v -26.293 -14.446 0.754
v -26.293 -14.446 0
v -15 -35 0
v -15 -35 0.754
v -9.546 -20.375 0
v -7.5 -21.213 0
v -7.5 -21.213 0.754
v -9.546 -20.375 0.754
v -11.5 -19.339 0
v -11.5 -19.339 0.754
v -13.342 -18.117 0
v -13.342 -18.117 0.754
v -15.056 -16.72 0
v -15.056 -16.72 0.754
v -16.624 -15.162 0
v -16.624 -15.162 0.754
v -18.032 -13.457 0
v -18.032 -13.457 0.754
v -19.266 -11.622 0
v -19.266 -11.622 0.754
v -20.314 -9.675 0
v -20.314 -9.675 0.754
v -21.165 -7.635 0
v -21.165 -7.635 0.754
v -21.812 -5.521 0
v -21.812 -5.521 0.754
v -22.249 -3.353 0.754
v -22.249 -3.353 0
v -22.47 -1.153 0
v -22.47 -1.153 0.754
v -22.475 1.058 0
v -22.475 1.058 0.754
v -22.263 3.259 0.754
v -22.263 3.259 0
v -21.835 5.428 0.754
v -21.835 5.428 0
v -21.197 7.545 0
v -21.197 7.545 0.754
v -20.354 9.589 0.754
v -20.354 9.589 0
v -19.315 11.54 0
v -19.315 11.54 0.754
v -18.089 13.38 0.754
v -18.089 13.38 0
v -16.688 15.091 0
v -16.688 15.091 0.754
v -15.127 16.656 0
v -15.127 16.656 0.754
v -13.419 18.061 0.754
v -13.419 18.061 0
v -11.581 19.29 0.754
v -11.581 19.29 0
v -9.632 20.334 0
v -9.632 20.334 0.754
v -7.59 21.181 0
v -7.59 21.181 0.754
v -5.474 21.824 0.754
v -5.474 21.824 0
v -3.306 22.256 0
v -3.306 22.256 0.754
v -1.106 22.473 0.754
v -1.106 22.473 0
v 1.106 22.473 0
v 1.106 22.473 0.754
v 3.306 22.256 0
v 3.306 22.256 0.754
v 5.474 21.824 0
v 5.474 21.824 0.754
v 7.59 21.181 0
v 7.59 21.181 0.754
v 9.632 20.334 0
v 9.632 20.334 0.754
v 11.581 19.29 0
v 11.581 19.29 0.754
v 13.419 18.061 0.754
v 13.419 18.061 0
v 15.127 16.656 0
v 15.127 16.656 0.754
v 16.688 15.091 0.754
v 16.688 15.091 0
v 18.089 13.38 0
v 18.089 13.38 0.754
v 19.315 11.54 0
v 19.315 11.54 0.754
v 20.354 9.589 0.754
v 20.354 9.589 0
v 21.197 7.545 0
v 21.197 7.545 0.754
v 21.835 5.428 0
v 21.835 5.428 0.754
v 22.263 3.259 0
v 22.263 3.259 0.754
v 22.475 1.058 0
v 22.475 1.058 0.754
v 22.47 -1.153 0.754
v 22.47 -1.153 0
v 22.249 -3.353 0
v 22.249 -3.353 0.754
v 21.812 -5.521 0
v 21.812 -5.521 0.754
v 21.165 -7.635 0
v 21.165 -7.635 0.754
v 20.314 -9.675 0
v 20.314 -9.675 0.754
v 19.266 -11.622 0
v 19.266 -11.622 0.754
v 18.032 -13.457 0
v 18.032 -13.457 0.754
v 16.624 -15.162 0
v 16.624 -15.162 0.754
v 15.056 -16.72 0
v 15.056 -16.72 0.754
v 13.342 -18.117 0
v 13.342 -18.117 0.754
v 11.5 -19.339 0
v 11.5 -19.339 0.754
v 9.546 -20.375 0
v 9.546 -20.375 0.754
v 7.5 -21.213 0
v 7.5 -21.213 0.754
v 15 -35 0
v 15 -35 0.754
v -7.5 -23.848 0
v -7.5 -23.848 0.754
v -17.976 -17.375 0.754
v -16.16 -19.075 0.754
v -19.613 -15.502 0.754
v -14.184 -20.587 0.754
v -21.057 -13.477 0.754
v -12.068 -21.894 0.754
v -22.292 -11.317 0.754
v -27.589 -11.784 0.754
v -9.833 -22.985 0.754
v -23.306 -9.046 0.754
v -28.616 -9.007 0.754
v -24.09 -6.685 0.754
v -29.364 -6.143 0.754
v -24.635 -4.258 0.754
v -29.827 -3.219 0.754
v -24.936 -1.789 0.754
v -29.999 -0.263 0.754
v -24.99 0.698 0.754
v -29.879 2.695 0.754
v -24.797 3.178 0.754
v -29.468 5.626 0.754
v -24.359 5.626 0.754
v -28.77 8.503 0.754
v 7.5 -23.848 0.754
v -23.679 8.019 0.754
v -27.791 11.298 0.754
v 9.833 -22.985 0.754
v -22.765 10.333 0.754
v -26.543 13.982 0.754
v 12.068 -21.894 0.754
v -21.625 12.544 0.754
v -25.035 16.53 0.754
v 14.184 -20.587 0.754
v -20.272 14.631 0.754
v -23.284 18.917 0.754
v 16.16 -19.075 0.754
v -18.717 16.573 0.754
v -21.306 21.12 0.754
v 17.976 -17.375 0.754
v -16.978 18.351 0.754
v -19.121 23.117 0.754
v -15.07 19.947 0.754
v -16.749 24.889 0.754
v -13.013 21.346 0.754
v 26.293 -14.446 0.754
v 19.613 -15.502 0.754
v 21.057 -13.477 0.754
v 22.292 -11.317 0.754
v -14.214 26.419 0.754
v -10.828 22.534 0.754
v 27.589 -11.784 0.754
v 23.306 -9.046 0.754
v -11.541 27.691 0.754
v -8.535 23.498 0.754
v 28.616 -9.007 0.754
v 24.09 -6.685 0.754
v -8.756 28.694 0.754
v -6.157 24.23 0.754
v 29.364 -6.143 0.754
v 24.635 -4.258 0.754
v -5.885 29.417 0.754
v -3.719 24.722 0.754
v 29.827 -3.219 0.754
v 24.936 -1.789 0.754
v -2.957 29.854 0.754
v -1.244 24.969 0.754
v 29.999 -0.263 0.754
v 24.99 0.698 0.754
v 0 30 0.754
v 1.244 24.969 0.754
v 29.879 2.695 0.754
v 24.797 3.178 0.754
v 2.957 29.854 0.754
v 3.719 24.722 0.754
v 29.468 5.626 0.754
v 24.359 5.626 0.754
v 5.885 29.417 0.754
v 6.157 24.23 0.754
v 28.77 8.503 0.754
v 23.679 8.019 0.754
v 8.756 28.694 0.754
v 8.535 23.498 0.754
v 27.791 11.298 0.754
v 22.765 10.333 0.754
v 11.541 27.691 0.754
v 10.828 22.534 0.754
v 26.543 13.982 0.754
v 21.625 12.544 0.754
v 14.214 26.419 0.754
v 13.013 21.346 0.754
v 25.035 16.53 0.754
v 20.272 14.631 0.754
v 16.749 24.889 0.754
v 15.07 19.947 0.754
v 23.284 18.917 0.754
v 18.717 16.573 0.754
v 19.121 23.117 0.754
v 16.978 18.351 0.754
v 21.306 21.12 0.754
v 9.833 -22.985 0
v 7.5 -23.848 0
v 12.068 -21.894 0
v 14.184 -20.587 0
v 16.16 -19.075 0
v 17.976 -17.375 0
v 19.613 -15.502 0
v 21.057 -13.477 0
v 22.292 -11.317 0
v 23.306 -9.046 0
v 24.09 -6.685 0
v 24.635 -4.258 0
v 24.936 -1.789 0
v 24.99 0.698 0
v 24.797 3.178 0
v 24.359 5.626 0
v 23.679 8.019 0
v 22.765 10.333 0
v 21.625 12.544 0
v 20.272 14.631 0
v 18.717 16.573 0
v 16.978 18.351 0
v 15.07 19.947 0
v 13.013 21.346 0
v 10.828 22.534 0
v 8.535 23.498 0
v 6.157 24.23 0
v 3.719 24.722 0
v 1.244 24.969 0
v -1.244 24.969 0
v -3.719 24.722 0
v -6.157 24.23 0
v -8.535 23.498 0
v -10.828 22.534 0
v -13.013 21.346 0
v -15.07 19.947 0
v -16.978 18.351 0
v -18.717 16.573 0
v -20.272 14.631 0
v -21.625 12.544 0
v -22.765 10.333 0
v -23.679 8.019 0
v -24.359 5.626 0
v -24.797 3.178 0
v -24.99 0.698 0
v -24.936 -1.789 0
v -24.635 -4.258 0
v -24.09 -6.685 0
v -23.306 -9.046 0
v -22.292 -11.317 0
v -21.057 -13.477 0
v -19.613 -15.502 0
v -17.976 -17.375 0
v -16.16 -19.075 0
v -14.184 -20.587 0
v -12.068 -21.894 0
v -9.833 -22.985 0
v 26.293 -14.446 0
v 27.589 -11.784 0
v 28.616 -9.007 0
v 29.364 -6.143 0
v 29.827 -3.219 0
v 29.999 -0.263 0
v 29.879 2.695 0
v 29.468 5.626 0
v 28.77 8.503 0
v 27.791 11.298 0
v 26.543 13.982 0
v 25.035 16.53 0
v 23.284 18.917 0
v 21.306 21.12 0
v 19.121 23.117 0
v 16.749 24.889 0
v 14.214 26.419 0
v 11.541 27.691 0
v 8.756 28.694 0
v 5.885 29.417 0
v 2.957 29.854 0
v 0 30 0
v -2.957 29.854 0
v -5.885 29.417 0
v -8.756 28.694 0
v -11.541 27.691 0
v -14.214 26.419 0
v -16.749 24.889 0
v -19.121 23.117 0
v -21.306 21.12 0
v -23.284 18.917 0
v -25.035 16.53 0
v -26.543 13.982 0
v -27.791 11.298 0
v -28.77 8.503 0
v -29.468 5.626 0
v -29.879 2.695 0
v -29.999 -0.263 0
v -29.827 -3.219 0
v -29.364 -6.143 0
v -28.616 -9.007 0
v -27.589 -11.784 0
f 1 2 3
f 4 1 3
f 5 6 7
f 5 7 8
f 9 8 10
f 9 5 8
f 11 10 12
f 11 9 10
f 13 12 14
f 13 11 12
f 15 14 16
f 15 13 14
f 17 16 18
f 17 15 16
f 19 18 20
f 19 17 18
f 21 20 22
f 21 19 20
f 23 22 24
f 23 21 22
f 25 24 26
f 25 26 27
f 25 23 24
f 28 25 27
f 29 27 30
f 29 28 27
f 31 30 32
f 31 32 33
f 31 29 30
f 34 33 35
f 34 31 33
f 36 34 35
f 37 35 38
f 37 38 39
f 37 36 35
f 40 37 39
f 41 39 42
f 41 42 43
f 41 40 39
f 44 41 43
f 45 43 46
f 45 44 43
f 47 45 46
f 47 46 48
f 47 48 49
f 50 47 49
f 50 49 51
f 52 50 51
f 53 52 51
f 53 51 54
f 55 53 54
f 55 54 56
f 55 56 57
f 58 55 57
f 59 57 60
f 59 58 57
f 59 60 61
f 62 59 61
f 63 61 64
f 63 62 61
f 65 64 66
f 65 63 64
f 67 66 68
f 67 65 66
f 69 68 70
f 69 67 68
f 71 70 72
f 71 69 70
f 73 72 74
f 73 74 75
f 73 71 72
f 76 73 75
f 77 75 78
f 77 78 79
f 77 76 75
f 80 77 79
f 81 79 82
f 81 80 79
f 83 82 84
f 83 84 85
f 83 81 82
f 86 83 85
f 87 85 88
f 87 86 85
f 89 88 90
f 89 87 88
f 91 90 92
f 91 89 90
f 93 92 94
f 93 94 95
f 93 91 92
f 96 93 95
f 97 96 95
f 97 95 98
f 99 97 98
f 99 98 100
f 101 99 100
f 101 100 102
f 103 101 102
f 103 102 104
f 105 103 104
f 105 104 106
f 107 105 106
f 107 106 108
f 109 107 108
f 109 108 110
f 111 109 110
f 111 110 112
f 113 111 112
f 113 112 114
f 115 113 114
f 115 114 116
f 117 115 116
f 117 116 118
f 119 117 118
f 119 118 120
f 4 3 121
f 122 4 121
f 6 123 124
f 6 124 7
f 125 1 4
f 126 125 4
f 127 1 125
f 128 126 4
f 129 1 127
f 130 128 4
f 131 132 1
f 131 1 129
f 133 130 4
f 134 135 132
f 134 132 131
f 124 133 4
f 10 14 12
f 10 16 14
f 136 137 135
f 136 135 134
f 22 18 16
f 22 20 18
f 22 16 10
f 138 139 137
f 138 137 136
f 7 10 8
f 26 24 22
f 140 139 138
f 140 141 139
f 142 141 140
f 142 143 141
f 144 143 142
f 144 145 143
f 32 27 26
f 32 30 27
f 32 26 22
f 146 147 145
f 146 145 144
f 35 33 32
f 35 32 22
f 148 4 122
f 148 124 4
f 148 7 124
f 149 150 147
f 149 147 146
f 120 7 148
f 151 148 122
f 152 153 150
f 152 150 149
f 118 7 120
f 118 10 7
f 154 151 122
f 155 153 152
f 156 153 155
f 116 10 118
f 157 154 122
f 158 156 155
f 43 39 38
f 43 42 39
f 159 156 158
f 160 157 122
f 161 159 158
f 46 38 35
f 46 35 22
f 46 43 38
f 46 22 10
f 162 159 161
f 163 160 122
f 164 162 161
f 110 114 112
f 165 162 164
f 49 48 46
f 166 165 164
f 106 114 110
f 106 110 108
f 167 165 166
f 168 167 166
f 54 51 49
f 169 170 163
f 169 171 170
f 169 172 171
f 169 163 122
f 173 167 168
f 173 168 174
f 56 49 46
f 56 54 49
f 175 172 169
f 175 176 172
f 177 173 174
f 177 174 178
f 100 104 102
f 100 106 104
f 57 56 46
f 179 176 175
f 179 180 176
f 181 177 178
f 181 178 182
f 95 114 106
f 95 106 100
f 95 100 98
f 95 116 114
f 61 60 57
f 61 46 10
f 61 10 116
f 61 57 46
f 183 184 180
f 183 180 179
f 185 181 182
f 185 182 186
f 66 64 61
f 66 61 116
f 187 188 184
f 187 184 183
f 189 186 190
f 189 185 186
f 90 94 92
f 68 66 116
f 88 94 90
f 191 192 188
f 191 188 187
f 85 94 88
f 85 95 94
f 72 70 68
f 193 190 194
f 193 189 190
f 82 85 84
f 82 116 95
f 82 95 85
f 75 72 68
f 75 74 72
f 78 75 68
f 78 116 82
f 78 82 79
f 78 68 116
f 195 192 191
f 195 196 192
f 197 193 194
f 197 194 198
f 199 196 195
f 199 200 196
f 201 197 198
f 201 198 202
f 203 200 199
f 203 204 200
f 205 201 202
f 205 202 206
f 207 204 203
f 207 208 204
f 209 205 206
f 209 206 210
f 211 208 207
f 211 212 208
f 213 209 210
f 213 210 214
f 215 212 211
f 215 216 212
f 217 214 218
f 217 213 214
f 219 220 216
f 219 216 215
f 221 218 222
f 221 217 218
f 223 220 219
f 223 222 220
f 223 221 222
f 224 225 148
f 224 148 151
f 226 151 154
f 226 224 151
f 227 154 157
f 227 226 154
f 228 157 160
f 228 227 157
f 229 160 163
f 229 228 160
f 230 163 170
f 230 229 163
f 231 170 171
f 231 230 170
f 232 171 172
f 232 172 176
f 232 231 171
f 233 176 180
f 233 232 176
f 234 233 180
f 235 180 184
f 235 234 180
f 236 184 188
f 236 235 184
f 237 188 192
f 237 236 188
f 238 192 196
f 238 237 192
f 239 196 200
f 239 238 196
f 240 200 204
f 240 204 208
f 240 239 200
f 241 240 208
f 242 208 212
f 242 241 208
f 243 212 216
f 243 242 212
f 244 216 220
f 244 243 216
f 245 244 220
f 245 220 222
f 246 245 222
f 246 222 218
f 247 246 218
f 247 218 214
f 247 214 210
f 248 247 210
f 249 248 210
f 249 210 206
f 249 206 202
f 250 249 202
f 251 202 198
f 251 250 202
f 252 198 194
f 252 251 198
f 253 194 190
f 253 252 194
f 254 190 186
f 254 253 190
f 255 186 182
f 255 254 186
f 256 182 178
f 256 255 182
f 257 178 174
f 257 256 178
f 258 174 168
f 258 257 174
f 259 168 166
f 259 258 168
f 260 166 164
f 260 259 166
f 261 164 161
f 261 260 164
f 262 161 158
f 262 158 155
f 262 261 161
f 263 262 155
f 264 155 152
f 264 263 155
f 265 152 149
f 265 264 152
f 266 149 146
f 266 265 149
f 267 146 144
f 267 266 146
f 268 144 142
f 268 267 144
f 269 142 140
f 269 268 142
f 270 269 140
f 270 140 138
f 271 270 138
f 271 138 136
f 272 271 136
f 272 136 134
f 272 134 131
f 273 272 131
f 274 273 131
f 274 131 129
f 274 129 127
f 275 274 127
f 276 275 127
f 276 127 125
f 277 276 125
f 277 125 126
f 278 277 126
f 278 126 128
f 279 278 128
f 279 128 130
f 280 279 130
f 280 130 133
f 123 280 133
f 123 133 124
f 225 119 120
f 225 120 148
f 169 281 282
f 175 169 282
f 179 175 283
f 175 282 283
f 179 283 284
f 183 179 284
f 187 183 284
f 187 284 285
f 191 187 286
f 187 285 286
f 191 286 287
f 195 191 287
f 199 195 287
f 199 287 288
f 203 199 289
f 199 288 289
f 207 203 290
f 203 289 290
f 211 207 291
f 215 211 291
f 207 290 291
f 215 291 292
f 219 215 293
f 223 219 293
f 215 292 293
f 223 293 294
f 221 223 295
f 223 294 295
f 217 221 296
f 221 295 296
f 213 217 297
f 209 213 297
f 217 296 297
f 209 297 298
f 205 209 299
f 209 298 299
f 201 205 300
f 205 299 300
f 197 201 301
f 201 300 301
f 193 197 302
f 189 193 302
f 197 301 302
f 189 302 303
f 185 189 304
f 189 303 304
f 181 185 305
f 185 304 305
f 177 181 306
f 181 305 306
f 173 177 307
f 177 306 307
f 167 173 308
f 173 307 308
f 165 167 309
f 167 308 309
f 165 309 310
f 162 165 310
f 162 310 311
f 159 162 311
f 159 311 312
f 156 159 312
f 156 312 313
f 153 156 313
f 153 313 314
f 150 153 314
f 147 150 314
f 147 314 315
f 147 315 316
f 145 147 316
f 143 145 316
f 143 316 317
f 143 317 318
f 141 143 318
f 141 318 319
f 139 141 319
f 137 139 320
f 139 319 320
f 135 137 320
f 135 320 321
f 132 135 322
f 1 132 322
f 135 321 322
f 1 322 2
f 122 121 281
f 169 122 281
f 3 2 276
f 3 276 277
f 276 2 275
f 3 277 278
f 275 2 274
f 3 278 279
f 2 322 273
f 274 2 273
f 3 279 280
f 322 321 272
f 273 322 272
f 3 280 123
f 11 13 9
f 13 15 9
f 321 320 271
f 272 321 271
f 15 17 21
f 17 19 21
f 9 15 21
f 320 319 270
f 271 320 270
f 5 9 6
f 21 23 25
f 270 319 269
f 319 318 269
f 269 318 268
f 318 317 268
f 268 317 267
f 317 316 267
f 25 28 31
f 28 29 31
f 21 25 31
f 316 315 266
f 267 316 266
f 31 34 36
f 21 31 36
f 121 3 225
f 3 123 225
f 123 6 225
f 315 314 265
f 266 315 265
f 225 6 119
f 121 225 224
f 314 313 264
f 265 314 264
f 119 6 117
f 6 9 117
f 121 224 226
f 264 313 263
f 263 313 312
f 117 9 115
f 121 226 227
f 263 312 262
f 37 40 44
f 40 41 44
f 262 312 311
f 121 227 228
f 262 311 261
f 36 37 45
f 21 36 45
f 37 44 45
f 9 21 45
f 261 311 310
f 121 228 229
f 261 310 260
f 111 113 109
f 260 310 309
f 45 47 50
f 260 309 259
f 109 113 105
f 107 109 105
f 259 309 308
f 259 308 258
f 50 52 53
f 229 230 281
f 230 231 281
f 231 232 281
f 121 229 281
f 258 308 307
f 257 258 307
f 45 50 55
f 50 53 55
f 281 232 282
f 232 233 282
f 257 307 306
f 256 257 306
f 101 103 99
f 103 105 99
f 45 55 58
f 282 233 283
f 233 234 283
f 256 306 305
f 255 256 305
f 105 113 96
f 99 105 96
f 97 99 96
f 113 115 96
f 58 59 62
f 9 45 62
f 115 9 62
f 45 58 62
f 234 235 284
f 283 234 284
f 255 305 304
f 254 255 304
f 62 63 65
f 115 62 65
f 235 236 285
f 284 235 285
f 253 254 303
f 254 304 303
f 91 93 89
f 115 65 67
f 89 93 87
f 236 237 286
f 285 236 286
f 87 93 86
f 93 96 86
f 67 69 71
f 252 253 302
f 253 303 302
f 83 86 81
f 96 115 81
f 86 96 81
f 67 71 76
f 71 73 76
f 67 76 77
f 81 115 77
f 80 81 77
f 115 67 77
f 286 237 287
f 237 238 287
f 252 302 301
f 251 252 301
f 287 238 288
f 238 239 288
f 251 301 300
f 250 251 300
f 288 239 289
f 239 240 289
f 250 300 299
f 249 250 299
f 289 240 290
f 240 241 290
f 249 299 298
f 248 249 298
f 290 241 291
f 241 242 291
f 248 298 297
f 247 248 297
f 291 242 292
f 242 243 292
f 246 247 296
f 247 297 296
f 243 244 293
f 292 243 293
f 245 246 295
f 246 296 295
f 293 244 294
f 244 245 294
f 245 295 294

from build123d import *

# Parameters (mm, degrees)
BOSS_EXTRUDE1_DEPTH = 0.75438


with BuildPart() as part:
    # Sketch1 → Boss-Extrude1 (new body)
    with BuildSketch(Plane.XY):
        with BuildLine():
            Line((-15, -35), (15, -35))
            Line((15, -35), (26.292884648, -14.44590658))
            ThreePointArc((26.292884648, -14.44590658), (0, 30), (-26.292884648, -14.44590658))
            Line((-26.292884648, -14.44590658), (-15, -35))
        make_face()
        with BuildLine():
            Line((-7.5, -23.848480035), (-7.5, -21.213203436))
            ThreePointArc((-7.5, -21.213203436), (0, 22.5), (7.5, -21.213203436))
            Line((7.5, -21.213203436), (7.5, -23.848480035))
            ThreePointArc((7.5, -23.848480035), (0, 25), (-7.5, -23.848480035))
        make_face(mode=Mode.SUBTRACT)
    extrude(amount=BOSS_EXTRUDE1_DEPTH)


solid = part.part
